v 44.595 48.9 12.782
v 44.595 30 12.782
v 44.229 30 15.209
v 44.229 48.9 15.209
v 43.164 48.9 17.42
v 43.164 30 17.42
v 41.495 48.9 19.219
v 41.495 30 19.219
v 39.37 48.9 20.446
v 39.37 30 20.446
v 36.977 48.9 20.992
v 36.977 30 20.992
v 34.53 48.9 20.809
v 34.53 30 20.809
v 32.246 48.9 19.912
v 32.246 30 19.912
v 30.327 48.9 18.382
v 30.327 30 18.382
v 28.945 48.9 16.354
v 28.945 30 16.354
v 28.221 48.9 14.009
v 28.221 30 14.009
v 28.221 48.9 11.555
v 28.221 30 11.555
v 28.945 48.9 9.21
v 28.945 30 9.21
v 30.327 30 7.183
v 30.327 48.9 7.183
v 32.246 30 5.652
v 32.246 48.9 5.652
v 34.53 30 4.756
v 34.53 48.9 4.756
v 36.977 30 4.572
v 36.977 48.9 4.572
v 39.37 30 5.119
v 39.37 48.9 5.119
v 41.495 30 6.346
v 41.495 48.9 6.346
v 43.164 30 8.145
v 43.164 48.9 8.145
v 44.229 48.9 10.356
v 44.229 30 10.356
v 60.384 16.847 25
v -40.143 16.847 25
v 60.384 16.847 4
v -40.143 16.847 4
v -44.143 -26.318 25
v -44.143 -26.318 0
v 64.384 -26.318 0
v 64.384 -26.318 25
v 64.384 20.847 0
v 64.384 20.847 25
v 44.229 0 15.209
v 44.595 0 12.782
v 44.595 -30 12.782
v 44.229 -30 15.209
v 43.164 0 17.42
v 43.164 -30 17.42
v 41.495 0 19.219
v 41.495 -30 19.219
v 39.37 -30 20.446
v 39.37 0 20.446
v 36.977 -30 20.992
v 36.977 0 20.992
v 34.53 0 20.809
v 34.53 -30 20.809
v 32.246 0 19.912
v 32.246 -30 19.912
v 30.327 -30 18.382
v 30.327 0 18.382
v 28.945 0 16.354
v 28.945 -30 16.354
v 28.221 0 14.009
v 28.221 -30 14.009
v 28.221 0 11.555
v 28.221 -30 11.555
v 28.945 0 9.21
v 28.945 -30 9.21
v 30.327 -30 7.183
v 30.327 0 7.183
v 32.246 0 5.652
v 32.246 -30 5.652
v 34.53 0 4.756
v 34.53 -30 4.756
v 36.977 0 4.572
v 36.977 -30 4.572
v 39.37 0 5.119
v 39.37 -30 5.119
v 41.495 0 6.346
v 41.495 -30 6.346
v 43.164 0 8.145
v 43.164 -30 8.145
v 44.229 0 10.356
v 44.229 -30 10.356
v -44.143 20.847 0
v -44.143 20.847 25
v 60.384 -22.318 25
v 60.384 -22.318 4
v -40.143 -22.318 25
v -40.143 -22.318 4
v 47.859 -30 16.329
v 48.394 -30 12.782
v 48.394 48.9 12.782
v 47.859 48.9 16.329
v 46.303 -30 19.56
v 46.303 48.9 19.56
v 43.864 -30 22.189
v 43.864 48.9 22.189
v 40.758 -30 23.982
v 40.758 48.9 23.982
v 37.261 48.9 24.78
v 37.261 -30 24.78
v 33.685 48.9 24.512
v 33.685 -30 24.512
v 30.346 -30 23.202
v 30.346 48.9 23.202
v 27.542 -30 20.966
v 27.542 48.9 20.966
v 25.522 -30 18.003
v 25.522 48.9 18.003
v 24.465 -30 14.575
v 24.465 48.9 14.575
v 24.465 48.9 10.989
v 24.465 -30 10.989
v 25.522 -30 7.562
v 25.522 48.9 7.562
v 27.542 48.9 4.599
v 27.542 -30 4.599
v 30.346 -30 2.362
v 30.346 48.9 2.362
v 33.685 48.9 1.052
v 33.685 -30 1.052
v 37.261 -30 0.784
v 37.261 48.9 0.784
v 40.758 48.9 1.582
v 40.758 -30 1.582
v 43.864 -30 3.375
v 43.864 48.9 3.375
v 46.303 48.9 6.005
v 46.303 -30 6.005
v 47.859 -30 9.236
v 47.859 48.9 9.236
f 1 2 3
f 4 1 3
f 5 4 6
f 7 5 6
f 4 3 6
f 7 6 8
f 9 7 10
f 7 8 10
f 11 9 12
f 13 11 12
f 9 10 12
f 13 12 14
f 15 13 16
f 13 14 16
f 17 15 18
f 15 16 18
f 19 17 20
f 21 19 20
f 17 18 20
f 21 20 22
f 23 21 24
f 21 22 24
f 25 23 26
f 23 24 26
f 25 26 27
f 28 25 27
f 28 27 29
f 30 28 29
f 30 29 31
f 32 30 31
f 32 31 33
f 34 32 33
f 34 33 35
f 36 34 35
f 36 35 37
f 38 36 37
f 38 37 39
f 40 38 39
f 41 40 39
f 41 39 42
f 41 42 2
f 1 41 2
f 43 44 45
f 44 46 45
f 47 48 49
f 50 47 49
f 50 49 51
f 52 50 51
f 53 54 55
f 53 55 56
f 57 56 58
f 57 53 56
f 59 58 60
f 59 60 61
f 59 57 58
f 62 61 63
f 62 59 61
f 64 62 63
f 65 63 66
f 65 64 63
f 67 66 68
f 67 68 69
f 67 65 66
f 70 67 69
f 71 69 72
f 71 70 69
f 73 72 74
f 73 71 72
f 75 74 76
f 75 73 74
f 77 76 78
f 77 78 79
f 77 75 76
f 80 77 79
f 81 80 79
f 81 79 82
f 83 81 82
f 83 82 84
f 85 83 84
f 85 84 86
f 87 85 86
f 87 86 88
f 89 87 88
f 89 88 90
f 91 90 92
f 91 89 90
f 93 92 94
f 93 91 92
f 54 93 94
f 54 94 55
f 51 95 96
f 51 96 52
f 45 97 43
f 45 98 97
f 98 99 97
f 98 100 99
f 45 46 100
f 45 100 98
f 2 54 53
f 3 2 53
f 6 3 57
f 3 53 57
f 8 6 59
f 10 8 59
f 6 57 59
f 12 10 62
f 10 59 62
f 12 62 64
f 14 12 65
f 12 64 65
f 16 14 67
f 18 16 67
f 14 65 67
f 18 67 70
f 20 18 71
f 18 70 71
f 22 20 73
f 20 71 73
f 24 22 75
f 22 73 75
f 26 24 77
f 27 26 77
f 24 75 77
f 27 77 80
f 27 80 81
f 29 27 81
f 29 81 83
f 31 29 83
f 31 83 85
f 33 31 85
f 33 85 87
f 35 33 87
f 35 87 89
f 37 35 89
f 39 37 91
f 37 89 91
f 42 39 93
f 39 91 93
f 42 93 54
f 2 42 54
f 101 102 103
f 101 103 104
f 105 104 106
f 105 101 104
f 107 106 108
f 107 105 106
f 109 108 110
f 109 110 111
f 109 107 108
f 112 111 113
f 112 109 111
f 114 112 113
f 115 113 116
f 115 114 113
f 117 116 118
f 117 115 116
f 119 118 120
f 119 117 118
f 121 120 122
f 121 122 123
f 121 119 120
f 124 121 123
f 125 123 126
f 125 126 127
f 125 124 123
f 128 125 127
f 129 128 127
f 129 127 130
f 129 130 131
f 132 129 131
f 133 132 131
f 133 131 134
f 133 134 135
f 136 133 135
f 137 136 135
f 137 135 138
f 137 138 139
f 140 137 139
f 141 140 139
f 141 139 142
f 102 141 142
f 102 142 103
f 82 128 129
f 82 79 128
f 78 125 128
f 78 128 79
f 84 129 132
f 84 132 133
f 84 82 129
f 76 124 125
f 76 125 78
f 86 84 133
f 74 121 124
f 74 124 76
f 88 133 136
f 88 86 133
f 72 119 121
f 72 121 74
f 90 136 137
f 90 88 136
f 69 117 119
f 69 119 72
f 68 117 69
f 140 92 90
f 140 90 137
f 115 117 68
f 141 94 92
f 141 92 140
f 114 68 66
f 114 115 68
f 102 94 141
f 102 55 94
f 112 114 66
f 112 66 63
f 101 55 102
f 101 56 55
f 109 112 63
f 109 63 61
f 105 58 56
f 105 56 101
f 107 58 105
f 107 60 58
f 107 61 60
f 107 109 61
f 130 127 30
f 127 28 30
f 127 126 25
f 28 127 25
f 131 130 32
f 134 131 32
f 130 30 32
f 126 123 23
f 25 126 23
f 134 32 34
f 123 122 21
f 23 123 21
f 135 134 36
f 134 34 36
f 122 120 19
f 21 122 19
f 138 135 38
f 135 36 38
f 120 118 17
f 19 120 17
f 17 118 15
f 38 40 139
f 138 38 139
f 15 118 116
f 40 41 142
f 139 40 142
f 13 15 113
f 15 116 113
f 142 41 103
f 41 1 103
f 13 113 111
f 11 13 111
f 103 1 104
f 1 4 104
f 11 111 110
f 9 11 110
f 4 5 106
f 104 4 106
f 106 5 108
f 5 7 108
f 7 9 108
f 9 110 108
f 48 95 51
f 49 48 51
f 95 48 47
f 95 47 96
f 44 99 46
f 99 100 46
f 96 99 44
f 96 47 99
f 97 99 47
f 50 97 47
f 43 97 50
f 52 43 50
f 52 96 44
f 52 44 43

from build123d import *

# Parameters (mm, degrees)
F0_W          = 108.5266880691
F0_H          = 47.1645910293
F1_DEPTH      = 25
F2_T          = -4
F3_R          = 12.0317315012
F3_R_2        = 8.2327991294
F4_DEPTH      = 30
F4_DEPTH_BACK = 30
F5_DEPTH      = 78.9


with BuildPart() as f1:
    # F0 (on Top) → F1 (new body)
    with BuildSketch(Plane.XY):
        with Locations((10.1203862578, -2.7356250212)):
            Rectangle(F0_W, F0_H)
    extrude(amount=F1_DEPTH)

    # F2
    f2_openings = [f1.faces().sort_by_distance(p)[0] for p in [
        (10.120386, -2.735625, 25),
    ]]
    offset(amount=F2_T, openings=f2_openings)


with BuildPart() as f4:
    # F3 (on Front) → F4 (new body, two sides)
    with BuildSketch(Plane.XZ) as f4_sk:
        with Locations((36.3620221615, 12.7822495997)):
            Circle(F3_R)
        with Locations((36.3620221615, 12.7822495997)):
            Circle(F3_R_2, mode=Mode.SUBTRACT)
    extrude(amount=F4_DEPTH)
    extrude(f4_sk.sketch, amount=-F4_DEPTH_BACK)

    # F5 (add): a face of the model
    f5_faces = [f4.faces().sort_by_distance(p)[0] for p in [
        (24.6705994176, -30, 12.7822495997),
    ]]
    extrude(f5_faces, amount=-F5_DEPTH)


solid = Compound([f1.part, f4.part])
